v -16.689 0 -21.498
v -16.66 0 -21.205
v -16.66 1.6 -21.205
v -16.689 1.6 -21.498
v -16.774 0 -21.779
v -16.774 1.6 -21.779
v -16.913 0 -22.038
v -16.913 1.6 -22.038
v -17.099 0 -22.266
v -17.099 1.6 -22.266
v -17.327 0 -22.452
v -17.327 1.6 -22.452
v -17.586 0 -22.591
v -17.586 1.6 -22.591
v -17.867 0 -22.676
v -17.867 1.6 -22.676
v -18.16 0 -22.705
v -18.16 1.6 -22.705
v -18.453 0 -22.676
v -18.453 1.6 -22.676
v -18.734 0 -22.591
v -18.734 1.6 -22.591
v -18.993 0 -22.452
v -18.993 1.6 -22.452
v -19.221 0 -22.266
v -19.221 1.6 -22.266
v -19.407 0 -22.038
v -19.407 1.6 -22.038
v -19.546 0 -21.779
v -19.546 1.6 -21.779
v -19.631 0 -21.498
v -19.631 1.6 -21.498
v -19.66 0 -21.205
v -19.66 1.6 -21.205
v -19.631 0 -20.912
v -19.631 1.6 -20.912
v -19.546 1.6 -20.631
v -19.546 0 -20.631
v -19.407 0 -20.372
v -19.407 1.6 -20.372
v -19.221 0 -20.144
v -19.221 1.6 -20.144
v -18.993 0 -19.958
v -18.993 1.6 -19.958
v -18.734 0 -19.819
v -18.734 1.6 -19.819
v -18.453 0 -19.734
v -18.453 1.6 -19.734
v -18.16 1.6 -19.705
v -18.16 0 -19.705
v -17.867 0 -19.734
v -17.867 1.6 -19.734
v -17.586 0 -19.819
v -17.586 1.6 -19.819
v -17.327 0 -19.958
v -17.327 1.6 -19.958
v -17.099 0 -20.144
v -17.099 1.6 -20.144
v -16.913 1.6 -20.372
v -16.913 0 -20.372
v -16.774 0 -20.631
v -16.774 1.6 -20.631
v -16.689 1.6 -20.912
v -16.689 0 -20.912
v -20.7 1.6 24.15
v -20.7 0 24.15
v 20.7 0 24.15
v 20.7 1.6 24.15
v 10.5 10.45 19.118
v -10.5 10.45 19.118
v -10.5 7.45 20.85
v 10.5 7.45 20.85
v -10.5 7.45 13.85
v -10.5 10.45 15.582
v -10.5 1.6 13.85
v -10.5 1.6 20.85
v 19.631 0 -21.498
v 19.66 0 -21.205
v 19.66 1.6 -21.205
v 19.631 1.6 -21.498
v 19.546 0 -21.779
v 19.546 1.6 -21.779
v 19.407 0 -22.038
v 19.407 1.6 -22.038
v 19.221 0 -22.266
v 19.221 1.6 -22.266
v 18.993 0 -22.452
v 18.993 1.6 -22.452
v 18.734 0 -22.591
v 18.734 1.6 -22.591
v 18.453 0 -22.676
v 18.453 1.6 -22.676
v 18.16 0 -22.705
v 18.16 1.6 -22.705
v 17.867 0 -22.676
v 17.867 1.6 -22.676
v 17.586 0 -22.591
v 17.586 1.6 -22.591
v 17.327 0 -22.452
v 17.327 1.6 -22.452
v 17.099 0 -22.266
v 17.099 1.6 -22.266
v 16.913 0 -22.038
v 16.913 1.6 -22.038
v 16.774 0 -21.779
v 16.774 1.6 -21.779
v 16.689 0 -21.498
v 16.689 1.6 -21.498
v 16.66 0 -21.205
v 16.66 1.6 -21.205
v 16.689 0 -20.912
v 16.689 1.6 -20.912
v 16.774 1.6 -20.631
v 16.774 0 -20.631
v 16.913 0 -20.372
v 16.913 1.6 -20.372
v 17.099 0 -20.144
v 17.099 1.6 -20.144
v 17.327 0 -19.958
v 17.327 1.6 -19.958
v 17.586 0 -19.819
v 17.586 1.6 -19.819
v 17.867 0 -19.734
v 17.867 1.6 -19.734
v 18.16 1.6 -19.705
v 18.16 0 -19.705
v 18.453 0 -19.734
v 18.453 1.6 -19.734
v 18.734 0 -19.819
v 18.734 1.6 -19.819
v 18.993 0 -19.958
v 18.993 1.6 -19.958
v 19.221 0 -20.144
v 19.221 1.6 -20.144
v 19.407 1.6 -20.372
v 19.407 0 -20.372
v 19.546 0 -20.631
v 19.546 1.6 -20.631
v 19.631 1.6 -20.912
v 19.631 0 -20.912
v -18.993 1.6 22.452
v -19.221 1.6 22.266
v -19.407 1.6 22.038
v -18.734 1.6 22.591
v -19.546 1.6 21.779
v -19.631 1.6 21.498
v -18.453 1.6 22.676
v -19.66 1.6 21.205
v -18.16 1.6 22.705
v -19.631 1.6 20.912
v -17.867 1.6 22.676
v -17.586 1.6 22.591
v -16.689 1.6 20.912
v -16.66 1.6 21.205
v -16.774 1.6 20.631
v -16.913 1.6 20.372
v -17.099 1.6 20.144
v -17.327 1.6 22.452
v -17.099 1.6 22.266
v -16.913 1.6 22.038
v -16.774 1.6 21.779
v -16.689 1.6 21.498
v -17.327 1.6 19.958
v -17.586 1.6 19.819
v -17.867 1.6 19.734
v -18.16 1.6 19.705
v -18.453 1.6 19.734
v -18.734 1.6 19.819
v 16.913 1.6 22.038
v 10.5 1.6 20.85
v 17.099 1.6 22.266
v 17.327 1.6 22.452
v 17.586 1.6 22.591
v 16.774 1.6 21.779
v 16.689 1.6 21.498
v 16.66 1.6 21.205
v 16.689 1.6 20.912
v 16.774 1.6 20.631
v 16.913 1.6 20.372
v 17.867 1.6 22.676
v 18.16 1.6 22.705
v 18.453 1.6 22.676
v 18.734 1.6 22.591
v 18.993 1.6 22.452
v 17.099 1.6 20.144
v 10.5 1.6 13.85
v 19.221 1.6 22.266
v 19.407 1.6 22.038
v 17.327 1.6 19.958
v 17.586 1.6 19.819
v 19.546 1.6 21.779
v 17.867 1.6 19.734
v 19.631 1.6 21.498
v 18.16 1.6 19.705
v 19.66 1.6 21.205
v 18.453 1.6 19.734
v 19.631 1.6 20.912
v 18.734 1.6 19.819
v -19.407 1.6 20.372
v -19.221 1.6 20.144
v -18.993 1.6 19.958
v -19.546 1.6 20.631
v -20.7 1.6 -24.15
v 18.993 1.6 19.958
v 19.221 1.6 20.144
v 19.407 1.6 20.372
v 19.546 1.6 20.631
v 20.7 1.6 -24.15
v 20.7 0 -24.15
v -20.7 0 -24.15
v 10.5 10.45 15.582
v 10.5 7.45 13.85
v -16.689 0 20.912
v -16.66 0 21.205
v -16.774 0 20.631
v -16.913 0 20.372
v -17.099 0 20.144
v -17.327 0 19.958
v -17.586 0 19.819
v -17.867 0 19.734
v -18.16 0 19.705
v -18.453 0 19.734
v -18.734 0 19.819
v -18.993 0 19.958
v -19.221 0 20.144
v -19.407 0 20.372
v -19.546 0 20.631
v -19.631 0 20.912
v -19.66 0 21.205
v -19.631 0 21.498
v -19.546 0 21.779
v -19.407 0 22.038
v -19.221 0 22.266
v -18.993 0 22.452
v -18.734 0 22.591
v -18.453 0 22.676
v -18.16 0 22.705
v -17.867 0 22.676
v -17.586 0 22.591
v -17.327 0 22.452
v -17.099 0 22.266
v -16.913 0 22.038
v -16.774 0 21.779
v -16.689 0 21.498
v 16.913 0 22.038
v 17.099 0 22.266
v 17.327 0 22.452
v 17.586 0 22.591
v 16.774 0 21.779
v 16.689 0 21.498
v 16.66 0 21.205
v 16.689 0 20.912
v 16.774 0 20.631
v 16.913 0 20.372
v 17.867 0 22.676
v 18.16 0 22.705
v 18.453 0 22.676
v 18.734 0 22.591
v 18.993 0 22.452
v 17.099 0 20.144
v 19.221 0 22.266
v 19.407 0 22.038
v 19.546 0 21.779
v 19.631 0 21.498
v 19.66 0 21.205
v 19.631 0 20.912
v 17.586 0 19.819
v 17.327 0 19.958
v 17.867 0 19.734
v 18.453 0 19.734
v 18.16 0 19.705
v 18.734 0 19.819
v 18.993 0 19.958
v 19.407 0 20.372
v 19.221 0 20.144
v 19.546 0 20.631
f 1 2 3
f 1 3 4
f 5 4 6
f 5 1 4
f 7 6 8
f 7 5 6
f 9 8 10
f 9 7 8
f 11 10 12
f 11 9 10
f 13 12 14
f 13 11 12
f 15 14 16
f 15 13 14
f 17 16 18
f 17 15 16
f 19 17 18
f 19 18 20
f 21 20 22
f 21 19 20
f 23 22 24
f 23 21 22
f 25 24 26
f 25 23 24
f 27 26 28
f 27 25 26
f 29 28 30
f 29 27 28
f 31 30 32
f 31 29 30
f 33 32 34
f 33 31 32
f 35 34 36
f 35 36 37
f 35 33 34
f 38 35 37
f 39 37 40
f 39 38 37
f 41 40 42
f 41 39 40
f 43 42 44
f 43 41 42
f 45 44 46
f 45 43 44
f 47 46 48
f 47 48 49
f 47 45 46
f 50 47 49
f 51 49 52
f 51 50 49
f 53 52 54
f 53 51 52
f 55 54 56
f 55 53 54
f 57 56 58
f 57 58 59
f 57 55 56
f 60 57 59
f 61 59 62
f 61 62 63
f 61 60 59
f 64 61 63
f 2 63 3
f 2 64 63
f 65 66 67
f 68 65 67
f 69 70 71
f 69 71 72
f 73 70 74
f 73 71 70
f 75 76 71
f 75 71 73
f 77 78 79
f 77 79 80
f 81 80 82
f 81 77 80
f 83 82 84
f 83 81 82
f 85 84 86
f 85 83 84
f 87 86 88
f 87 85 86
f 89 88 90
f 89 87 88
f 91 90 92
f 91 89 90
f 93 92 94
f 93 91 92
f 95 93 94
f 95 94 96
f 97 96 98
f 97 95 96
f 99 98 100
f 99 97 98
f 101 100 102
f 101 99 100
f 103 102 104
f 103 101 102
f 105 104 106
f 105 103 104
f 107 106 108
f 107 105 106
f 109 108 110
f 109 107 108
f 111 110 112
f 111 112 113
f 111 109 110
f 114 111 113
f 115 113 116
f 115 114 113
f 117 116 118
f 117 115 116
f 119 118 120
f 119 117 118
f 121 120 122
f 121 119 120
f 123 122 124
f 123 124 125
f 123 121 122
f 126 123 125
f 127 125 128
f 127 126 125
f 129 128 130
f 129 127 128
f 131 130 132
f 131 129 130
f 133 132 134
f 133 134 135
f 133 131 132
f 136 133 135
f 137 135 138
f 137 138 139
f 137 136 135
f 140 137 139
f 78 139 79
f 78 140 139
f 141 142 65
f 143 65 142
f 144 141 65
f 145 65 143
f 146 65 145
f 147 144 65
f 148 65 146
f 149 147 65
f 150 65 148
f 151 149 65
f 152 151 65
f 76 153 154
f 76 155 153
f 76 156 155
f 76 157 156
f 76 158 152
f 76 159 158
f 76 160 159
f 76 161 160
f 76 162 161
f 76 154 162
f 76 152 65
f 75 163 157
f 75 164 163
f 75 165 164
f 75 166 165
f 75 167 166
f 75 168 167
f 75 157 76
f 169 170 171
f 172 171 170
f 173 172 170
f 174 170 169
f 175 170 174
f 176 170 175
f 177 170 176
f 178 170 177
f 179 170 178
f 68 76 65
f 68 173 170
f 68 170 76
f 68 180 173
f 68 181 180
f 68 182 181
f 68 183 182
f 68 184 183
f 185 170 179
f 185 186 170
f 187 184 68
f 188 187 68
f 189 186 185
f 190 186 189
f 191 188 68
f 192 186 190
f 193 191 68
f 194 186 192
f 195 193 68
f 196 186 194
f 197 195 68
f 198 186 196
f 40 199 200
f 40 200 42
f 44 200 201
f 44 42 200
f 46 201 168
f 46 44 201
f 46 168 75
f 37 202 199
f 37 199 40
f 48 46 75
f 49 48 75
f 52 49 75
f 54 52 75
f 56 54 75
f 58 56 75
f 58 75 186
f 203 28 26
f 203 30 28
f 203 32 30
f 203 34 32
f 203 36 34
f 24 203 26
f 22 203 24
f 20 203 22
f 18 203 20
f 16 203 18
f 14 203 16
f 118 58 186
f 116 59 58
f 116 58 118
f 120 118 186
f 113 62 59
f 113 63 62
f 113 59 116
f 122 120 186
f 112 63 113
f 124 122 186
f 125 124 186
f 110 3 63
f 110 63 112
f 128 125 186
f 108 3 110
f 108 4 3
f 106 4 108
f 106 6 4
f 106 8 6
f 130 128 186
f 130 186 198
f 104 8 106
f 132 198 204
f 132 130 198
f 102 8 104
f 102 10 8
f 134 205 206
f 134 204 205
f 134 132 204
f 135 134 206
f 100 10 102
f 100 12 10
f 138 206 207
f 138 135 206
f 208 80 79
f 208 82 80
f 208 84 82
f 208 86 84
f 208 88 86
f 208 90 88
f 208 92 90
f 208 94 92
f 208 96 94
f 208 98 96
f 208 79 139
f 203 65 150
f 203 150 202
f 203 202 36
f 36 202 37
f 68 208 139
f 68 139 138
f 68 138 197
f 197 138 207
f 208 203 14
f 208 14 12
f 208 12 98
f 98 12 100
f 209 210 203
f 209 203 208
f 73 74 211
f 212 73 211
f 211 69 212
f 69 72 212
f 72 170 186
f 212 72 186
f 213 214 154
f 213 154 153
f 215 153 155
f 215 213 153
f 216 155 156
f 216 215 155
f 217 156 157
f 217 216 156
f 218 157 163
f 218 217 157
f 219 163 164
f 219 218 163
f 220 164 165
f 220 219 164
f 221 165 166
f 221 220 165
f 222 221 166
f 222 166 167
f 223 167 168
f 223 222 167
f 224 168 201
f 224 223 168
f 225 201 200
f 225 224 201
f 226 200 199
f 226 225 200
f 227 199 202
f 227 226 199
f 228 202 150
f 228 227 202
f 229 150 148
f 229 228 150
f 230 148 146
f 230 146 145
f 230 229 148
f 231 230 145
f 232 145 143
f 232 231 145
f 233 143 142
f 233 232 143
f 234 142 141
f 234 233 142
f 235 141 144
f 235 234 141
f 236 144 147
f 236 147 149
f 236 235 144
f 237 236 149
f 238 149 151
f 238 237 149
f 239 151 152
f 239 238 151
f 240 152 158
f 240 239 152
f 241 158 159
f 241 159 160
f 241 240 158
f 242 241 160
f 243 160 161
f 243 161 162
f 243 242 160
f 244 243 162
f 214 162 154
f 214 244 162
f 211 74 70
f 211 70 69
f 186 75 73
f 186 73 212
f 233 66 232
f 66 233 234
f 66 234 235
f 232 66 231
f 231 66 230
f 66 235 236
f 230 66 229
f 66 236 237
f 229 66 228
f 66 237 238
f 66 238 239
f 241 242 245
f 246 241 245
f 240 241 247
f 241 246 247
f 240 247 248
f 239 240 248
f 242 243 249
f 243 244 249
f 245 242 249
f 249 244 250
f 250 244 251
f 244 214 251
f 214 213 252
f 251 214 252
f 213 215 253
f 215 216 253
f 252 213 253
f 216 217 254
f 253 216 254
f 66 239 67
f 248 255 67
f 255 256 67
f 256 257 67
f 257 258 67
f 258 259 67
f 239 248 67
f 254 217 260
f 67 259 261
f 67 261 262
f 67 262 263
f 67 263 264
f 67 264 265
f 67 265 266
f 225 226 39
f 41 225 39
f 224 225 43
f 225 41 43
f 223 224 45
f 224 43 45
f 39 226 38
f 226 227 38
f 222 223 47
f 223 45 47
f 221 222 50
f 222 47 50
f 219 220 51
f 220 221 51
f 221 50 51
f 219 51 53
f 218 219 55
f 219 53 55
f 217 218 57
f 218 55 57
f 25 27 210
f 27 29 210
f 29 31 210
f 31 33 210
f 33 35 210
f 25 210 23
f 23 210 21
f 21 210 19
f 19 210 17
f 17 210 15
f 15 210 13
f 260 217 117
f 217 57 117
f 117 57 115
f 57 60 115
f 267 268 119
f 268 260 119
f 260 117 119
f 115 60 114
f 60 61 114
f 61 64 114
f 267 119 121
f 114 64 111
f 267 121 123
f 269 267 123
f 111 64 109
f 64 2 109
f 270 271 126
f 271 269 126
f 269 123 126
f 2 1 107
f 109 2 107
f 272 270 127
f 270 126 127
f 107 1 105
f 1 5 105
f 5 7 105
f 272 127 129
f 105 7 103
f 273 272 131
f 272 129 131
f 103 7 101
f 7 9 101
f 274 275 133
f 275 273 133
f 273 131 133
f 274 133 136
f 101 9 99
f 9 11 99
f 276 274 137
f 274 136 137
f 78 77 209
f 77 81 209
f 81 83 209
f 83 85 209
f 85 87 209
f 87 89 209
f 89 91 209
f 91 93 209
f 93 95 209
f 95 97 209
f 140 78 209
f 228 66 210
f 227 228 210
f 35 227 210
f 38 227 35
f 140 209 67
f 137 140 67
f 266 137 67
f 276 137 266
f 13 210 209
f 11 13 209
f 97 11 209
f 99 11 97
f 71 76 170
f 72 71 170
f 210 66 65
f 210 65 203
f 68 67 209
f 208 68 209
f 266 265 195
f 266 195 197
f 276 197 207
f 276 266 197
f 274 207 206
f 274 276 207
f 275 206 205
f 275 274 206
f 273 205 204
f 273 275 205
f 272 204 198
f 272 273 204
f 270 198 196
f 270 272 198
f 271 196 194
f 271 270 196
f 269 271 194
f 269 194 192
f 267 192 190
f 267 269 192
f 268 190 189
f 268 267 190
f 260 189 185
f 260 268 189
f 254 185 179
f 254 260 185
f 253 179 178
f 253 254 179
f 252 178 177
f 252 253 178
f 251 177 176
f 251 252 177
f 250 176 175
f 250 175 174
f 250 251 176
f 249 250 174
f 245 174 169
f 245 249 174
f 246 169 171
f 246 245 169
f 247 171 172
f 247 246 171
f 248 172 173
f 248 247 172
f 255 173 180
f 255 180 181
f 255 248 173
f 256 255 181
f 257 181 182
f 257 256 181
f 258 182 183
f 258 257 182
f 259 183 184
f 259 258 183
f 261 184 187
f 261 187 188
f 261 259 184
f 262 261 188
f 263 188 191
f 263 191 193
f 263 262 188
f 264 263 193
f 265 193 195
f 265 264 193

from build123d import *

# Parameters (mm, degrees)
SKETCH1_W             = 41.4
SKETCH1_H             = 48.3
SKETCH1_R             = 1.5
BOSS_EXTRUDE1_DEPTH   = 1.6
SKETCH2_W             = 21
SKETCH2_H             = 7
BOSS_EXTRUDE2_DEPTH   = 8.85
CHAMFER1_SIZE         = 3
CHAMFER1_SIZE2        = 1.732050808
CHAMFER1_PART_2_SIZE  = 3
CHAMFER1_PART_2_SIZE2 = 1.732050808


with BuildPart() as part:
    # Sketch1 → Boss-Extrude1 (new body)
    with BuildSketch(Plane(origin=(0, 0, 0), x_dir=(1, 0, 0), z_dir=(0, 1, 0))):
        Rectangle(SKETCH1_W, SKETCH1_H)
        with Locations((-18.16, 21.205)):
            Circle(SKETCH1_R, mode=Mode.SUBTRACT)
        with Locations((18.16, 21.205)):
            Circle(SKETCH1_R, mode=Mode.SUBTRACT)
        with Locations((18.16, -21.205)):
            Circle(SKETCH1_R, mode=Mode.SUBTRACT)
        with Locations((-18.16, -21.205)):
            Circle(SKETCH1_R, mode=Mode.SUBTRACT)
    extrude(amount=BOSS_EXTRUDE1_DEPTH)

    # Sketch2 → Boss-Extrude2 (add)
    with BuildSketch(Plane(origin=(0, 1.6, 0), x_dir=(1, 0, 0), z_dir=(0, 1, 0))):
        with Locations((0, -17.35)):
            Rectangle(SKETCH2_W, SKETCH2_H)
    extrude(amount=BOSS_EXTRUDE2_DEPTH)

    # Chamfer1
    chamfer1_edges = [part.edges().sort_by_distance(p)[0] for p in [
        (0, 10.45, 13.85),
    ]]
    chamfer1_side = [part.faces().sort_by_distance(p)[0] for p in [
        (0, 6.025, 13.85),
    ]]
    chamfer(chamfer1_edges, length=CHAMFER1_SIZE, length2=CHAMFER1_SIZE2, reference=chamfer1_side[0])

    # Chamfer1 part 2
    chamfer1_part_2_edges = [part.edges().sort_by_distance(p)[0] for p in [
        (0, 10.45, 20.85),
    ]]
    chamfer1_part_2_side = [part.faces().sort_by_distance(p)[0] for p in [
        (0, 6.025, 20.85),
    ]]
    chamfer(chamfer1_part_2_edges, length=CHAMFER1_PART_2_SIZE, length2=CHAMFER1_PART_2_SIZE2, reference=chamfer1_part_2_side[0])


solid = part.part
